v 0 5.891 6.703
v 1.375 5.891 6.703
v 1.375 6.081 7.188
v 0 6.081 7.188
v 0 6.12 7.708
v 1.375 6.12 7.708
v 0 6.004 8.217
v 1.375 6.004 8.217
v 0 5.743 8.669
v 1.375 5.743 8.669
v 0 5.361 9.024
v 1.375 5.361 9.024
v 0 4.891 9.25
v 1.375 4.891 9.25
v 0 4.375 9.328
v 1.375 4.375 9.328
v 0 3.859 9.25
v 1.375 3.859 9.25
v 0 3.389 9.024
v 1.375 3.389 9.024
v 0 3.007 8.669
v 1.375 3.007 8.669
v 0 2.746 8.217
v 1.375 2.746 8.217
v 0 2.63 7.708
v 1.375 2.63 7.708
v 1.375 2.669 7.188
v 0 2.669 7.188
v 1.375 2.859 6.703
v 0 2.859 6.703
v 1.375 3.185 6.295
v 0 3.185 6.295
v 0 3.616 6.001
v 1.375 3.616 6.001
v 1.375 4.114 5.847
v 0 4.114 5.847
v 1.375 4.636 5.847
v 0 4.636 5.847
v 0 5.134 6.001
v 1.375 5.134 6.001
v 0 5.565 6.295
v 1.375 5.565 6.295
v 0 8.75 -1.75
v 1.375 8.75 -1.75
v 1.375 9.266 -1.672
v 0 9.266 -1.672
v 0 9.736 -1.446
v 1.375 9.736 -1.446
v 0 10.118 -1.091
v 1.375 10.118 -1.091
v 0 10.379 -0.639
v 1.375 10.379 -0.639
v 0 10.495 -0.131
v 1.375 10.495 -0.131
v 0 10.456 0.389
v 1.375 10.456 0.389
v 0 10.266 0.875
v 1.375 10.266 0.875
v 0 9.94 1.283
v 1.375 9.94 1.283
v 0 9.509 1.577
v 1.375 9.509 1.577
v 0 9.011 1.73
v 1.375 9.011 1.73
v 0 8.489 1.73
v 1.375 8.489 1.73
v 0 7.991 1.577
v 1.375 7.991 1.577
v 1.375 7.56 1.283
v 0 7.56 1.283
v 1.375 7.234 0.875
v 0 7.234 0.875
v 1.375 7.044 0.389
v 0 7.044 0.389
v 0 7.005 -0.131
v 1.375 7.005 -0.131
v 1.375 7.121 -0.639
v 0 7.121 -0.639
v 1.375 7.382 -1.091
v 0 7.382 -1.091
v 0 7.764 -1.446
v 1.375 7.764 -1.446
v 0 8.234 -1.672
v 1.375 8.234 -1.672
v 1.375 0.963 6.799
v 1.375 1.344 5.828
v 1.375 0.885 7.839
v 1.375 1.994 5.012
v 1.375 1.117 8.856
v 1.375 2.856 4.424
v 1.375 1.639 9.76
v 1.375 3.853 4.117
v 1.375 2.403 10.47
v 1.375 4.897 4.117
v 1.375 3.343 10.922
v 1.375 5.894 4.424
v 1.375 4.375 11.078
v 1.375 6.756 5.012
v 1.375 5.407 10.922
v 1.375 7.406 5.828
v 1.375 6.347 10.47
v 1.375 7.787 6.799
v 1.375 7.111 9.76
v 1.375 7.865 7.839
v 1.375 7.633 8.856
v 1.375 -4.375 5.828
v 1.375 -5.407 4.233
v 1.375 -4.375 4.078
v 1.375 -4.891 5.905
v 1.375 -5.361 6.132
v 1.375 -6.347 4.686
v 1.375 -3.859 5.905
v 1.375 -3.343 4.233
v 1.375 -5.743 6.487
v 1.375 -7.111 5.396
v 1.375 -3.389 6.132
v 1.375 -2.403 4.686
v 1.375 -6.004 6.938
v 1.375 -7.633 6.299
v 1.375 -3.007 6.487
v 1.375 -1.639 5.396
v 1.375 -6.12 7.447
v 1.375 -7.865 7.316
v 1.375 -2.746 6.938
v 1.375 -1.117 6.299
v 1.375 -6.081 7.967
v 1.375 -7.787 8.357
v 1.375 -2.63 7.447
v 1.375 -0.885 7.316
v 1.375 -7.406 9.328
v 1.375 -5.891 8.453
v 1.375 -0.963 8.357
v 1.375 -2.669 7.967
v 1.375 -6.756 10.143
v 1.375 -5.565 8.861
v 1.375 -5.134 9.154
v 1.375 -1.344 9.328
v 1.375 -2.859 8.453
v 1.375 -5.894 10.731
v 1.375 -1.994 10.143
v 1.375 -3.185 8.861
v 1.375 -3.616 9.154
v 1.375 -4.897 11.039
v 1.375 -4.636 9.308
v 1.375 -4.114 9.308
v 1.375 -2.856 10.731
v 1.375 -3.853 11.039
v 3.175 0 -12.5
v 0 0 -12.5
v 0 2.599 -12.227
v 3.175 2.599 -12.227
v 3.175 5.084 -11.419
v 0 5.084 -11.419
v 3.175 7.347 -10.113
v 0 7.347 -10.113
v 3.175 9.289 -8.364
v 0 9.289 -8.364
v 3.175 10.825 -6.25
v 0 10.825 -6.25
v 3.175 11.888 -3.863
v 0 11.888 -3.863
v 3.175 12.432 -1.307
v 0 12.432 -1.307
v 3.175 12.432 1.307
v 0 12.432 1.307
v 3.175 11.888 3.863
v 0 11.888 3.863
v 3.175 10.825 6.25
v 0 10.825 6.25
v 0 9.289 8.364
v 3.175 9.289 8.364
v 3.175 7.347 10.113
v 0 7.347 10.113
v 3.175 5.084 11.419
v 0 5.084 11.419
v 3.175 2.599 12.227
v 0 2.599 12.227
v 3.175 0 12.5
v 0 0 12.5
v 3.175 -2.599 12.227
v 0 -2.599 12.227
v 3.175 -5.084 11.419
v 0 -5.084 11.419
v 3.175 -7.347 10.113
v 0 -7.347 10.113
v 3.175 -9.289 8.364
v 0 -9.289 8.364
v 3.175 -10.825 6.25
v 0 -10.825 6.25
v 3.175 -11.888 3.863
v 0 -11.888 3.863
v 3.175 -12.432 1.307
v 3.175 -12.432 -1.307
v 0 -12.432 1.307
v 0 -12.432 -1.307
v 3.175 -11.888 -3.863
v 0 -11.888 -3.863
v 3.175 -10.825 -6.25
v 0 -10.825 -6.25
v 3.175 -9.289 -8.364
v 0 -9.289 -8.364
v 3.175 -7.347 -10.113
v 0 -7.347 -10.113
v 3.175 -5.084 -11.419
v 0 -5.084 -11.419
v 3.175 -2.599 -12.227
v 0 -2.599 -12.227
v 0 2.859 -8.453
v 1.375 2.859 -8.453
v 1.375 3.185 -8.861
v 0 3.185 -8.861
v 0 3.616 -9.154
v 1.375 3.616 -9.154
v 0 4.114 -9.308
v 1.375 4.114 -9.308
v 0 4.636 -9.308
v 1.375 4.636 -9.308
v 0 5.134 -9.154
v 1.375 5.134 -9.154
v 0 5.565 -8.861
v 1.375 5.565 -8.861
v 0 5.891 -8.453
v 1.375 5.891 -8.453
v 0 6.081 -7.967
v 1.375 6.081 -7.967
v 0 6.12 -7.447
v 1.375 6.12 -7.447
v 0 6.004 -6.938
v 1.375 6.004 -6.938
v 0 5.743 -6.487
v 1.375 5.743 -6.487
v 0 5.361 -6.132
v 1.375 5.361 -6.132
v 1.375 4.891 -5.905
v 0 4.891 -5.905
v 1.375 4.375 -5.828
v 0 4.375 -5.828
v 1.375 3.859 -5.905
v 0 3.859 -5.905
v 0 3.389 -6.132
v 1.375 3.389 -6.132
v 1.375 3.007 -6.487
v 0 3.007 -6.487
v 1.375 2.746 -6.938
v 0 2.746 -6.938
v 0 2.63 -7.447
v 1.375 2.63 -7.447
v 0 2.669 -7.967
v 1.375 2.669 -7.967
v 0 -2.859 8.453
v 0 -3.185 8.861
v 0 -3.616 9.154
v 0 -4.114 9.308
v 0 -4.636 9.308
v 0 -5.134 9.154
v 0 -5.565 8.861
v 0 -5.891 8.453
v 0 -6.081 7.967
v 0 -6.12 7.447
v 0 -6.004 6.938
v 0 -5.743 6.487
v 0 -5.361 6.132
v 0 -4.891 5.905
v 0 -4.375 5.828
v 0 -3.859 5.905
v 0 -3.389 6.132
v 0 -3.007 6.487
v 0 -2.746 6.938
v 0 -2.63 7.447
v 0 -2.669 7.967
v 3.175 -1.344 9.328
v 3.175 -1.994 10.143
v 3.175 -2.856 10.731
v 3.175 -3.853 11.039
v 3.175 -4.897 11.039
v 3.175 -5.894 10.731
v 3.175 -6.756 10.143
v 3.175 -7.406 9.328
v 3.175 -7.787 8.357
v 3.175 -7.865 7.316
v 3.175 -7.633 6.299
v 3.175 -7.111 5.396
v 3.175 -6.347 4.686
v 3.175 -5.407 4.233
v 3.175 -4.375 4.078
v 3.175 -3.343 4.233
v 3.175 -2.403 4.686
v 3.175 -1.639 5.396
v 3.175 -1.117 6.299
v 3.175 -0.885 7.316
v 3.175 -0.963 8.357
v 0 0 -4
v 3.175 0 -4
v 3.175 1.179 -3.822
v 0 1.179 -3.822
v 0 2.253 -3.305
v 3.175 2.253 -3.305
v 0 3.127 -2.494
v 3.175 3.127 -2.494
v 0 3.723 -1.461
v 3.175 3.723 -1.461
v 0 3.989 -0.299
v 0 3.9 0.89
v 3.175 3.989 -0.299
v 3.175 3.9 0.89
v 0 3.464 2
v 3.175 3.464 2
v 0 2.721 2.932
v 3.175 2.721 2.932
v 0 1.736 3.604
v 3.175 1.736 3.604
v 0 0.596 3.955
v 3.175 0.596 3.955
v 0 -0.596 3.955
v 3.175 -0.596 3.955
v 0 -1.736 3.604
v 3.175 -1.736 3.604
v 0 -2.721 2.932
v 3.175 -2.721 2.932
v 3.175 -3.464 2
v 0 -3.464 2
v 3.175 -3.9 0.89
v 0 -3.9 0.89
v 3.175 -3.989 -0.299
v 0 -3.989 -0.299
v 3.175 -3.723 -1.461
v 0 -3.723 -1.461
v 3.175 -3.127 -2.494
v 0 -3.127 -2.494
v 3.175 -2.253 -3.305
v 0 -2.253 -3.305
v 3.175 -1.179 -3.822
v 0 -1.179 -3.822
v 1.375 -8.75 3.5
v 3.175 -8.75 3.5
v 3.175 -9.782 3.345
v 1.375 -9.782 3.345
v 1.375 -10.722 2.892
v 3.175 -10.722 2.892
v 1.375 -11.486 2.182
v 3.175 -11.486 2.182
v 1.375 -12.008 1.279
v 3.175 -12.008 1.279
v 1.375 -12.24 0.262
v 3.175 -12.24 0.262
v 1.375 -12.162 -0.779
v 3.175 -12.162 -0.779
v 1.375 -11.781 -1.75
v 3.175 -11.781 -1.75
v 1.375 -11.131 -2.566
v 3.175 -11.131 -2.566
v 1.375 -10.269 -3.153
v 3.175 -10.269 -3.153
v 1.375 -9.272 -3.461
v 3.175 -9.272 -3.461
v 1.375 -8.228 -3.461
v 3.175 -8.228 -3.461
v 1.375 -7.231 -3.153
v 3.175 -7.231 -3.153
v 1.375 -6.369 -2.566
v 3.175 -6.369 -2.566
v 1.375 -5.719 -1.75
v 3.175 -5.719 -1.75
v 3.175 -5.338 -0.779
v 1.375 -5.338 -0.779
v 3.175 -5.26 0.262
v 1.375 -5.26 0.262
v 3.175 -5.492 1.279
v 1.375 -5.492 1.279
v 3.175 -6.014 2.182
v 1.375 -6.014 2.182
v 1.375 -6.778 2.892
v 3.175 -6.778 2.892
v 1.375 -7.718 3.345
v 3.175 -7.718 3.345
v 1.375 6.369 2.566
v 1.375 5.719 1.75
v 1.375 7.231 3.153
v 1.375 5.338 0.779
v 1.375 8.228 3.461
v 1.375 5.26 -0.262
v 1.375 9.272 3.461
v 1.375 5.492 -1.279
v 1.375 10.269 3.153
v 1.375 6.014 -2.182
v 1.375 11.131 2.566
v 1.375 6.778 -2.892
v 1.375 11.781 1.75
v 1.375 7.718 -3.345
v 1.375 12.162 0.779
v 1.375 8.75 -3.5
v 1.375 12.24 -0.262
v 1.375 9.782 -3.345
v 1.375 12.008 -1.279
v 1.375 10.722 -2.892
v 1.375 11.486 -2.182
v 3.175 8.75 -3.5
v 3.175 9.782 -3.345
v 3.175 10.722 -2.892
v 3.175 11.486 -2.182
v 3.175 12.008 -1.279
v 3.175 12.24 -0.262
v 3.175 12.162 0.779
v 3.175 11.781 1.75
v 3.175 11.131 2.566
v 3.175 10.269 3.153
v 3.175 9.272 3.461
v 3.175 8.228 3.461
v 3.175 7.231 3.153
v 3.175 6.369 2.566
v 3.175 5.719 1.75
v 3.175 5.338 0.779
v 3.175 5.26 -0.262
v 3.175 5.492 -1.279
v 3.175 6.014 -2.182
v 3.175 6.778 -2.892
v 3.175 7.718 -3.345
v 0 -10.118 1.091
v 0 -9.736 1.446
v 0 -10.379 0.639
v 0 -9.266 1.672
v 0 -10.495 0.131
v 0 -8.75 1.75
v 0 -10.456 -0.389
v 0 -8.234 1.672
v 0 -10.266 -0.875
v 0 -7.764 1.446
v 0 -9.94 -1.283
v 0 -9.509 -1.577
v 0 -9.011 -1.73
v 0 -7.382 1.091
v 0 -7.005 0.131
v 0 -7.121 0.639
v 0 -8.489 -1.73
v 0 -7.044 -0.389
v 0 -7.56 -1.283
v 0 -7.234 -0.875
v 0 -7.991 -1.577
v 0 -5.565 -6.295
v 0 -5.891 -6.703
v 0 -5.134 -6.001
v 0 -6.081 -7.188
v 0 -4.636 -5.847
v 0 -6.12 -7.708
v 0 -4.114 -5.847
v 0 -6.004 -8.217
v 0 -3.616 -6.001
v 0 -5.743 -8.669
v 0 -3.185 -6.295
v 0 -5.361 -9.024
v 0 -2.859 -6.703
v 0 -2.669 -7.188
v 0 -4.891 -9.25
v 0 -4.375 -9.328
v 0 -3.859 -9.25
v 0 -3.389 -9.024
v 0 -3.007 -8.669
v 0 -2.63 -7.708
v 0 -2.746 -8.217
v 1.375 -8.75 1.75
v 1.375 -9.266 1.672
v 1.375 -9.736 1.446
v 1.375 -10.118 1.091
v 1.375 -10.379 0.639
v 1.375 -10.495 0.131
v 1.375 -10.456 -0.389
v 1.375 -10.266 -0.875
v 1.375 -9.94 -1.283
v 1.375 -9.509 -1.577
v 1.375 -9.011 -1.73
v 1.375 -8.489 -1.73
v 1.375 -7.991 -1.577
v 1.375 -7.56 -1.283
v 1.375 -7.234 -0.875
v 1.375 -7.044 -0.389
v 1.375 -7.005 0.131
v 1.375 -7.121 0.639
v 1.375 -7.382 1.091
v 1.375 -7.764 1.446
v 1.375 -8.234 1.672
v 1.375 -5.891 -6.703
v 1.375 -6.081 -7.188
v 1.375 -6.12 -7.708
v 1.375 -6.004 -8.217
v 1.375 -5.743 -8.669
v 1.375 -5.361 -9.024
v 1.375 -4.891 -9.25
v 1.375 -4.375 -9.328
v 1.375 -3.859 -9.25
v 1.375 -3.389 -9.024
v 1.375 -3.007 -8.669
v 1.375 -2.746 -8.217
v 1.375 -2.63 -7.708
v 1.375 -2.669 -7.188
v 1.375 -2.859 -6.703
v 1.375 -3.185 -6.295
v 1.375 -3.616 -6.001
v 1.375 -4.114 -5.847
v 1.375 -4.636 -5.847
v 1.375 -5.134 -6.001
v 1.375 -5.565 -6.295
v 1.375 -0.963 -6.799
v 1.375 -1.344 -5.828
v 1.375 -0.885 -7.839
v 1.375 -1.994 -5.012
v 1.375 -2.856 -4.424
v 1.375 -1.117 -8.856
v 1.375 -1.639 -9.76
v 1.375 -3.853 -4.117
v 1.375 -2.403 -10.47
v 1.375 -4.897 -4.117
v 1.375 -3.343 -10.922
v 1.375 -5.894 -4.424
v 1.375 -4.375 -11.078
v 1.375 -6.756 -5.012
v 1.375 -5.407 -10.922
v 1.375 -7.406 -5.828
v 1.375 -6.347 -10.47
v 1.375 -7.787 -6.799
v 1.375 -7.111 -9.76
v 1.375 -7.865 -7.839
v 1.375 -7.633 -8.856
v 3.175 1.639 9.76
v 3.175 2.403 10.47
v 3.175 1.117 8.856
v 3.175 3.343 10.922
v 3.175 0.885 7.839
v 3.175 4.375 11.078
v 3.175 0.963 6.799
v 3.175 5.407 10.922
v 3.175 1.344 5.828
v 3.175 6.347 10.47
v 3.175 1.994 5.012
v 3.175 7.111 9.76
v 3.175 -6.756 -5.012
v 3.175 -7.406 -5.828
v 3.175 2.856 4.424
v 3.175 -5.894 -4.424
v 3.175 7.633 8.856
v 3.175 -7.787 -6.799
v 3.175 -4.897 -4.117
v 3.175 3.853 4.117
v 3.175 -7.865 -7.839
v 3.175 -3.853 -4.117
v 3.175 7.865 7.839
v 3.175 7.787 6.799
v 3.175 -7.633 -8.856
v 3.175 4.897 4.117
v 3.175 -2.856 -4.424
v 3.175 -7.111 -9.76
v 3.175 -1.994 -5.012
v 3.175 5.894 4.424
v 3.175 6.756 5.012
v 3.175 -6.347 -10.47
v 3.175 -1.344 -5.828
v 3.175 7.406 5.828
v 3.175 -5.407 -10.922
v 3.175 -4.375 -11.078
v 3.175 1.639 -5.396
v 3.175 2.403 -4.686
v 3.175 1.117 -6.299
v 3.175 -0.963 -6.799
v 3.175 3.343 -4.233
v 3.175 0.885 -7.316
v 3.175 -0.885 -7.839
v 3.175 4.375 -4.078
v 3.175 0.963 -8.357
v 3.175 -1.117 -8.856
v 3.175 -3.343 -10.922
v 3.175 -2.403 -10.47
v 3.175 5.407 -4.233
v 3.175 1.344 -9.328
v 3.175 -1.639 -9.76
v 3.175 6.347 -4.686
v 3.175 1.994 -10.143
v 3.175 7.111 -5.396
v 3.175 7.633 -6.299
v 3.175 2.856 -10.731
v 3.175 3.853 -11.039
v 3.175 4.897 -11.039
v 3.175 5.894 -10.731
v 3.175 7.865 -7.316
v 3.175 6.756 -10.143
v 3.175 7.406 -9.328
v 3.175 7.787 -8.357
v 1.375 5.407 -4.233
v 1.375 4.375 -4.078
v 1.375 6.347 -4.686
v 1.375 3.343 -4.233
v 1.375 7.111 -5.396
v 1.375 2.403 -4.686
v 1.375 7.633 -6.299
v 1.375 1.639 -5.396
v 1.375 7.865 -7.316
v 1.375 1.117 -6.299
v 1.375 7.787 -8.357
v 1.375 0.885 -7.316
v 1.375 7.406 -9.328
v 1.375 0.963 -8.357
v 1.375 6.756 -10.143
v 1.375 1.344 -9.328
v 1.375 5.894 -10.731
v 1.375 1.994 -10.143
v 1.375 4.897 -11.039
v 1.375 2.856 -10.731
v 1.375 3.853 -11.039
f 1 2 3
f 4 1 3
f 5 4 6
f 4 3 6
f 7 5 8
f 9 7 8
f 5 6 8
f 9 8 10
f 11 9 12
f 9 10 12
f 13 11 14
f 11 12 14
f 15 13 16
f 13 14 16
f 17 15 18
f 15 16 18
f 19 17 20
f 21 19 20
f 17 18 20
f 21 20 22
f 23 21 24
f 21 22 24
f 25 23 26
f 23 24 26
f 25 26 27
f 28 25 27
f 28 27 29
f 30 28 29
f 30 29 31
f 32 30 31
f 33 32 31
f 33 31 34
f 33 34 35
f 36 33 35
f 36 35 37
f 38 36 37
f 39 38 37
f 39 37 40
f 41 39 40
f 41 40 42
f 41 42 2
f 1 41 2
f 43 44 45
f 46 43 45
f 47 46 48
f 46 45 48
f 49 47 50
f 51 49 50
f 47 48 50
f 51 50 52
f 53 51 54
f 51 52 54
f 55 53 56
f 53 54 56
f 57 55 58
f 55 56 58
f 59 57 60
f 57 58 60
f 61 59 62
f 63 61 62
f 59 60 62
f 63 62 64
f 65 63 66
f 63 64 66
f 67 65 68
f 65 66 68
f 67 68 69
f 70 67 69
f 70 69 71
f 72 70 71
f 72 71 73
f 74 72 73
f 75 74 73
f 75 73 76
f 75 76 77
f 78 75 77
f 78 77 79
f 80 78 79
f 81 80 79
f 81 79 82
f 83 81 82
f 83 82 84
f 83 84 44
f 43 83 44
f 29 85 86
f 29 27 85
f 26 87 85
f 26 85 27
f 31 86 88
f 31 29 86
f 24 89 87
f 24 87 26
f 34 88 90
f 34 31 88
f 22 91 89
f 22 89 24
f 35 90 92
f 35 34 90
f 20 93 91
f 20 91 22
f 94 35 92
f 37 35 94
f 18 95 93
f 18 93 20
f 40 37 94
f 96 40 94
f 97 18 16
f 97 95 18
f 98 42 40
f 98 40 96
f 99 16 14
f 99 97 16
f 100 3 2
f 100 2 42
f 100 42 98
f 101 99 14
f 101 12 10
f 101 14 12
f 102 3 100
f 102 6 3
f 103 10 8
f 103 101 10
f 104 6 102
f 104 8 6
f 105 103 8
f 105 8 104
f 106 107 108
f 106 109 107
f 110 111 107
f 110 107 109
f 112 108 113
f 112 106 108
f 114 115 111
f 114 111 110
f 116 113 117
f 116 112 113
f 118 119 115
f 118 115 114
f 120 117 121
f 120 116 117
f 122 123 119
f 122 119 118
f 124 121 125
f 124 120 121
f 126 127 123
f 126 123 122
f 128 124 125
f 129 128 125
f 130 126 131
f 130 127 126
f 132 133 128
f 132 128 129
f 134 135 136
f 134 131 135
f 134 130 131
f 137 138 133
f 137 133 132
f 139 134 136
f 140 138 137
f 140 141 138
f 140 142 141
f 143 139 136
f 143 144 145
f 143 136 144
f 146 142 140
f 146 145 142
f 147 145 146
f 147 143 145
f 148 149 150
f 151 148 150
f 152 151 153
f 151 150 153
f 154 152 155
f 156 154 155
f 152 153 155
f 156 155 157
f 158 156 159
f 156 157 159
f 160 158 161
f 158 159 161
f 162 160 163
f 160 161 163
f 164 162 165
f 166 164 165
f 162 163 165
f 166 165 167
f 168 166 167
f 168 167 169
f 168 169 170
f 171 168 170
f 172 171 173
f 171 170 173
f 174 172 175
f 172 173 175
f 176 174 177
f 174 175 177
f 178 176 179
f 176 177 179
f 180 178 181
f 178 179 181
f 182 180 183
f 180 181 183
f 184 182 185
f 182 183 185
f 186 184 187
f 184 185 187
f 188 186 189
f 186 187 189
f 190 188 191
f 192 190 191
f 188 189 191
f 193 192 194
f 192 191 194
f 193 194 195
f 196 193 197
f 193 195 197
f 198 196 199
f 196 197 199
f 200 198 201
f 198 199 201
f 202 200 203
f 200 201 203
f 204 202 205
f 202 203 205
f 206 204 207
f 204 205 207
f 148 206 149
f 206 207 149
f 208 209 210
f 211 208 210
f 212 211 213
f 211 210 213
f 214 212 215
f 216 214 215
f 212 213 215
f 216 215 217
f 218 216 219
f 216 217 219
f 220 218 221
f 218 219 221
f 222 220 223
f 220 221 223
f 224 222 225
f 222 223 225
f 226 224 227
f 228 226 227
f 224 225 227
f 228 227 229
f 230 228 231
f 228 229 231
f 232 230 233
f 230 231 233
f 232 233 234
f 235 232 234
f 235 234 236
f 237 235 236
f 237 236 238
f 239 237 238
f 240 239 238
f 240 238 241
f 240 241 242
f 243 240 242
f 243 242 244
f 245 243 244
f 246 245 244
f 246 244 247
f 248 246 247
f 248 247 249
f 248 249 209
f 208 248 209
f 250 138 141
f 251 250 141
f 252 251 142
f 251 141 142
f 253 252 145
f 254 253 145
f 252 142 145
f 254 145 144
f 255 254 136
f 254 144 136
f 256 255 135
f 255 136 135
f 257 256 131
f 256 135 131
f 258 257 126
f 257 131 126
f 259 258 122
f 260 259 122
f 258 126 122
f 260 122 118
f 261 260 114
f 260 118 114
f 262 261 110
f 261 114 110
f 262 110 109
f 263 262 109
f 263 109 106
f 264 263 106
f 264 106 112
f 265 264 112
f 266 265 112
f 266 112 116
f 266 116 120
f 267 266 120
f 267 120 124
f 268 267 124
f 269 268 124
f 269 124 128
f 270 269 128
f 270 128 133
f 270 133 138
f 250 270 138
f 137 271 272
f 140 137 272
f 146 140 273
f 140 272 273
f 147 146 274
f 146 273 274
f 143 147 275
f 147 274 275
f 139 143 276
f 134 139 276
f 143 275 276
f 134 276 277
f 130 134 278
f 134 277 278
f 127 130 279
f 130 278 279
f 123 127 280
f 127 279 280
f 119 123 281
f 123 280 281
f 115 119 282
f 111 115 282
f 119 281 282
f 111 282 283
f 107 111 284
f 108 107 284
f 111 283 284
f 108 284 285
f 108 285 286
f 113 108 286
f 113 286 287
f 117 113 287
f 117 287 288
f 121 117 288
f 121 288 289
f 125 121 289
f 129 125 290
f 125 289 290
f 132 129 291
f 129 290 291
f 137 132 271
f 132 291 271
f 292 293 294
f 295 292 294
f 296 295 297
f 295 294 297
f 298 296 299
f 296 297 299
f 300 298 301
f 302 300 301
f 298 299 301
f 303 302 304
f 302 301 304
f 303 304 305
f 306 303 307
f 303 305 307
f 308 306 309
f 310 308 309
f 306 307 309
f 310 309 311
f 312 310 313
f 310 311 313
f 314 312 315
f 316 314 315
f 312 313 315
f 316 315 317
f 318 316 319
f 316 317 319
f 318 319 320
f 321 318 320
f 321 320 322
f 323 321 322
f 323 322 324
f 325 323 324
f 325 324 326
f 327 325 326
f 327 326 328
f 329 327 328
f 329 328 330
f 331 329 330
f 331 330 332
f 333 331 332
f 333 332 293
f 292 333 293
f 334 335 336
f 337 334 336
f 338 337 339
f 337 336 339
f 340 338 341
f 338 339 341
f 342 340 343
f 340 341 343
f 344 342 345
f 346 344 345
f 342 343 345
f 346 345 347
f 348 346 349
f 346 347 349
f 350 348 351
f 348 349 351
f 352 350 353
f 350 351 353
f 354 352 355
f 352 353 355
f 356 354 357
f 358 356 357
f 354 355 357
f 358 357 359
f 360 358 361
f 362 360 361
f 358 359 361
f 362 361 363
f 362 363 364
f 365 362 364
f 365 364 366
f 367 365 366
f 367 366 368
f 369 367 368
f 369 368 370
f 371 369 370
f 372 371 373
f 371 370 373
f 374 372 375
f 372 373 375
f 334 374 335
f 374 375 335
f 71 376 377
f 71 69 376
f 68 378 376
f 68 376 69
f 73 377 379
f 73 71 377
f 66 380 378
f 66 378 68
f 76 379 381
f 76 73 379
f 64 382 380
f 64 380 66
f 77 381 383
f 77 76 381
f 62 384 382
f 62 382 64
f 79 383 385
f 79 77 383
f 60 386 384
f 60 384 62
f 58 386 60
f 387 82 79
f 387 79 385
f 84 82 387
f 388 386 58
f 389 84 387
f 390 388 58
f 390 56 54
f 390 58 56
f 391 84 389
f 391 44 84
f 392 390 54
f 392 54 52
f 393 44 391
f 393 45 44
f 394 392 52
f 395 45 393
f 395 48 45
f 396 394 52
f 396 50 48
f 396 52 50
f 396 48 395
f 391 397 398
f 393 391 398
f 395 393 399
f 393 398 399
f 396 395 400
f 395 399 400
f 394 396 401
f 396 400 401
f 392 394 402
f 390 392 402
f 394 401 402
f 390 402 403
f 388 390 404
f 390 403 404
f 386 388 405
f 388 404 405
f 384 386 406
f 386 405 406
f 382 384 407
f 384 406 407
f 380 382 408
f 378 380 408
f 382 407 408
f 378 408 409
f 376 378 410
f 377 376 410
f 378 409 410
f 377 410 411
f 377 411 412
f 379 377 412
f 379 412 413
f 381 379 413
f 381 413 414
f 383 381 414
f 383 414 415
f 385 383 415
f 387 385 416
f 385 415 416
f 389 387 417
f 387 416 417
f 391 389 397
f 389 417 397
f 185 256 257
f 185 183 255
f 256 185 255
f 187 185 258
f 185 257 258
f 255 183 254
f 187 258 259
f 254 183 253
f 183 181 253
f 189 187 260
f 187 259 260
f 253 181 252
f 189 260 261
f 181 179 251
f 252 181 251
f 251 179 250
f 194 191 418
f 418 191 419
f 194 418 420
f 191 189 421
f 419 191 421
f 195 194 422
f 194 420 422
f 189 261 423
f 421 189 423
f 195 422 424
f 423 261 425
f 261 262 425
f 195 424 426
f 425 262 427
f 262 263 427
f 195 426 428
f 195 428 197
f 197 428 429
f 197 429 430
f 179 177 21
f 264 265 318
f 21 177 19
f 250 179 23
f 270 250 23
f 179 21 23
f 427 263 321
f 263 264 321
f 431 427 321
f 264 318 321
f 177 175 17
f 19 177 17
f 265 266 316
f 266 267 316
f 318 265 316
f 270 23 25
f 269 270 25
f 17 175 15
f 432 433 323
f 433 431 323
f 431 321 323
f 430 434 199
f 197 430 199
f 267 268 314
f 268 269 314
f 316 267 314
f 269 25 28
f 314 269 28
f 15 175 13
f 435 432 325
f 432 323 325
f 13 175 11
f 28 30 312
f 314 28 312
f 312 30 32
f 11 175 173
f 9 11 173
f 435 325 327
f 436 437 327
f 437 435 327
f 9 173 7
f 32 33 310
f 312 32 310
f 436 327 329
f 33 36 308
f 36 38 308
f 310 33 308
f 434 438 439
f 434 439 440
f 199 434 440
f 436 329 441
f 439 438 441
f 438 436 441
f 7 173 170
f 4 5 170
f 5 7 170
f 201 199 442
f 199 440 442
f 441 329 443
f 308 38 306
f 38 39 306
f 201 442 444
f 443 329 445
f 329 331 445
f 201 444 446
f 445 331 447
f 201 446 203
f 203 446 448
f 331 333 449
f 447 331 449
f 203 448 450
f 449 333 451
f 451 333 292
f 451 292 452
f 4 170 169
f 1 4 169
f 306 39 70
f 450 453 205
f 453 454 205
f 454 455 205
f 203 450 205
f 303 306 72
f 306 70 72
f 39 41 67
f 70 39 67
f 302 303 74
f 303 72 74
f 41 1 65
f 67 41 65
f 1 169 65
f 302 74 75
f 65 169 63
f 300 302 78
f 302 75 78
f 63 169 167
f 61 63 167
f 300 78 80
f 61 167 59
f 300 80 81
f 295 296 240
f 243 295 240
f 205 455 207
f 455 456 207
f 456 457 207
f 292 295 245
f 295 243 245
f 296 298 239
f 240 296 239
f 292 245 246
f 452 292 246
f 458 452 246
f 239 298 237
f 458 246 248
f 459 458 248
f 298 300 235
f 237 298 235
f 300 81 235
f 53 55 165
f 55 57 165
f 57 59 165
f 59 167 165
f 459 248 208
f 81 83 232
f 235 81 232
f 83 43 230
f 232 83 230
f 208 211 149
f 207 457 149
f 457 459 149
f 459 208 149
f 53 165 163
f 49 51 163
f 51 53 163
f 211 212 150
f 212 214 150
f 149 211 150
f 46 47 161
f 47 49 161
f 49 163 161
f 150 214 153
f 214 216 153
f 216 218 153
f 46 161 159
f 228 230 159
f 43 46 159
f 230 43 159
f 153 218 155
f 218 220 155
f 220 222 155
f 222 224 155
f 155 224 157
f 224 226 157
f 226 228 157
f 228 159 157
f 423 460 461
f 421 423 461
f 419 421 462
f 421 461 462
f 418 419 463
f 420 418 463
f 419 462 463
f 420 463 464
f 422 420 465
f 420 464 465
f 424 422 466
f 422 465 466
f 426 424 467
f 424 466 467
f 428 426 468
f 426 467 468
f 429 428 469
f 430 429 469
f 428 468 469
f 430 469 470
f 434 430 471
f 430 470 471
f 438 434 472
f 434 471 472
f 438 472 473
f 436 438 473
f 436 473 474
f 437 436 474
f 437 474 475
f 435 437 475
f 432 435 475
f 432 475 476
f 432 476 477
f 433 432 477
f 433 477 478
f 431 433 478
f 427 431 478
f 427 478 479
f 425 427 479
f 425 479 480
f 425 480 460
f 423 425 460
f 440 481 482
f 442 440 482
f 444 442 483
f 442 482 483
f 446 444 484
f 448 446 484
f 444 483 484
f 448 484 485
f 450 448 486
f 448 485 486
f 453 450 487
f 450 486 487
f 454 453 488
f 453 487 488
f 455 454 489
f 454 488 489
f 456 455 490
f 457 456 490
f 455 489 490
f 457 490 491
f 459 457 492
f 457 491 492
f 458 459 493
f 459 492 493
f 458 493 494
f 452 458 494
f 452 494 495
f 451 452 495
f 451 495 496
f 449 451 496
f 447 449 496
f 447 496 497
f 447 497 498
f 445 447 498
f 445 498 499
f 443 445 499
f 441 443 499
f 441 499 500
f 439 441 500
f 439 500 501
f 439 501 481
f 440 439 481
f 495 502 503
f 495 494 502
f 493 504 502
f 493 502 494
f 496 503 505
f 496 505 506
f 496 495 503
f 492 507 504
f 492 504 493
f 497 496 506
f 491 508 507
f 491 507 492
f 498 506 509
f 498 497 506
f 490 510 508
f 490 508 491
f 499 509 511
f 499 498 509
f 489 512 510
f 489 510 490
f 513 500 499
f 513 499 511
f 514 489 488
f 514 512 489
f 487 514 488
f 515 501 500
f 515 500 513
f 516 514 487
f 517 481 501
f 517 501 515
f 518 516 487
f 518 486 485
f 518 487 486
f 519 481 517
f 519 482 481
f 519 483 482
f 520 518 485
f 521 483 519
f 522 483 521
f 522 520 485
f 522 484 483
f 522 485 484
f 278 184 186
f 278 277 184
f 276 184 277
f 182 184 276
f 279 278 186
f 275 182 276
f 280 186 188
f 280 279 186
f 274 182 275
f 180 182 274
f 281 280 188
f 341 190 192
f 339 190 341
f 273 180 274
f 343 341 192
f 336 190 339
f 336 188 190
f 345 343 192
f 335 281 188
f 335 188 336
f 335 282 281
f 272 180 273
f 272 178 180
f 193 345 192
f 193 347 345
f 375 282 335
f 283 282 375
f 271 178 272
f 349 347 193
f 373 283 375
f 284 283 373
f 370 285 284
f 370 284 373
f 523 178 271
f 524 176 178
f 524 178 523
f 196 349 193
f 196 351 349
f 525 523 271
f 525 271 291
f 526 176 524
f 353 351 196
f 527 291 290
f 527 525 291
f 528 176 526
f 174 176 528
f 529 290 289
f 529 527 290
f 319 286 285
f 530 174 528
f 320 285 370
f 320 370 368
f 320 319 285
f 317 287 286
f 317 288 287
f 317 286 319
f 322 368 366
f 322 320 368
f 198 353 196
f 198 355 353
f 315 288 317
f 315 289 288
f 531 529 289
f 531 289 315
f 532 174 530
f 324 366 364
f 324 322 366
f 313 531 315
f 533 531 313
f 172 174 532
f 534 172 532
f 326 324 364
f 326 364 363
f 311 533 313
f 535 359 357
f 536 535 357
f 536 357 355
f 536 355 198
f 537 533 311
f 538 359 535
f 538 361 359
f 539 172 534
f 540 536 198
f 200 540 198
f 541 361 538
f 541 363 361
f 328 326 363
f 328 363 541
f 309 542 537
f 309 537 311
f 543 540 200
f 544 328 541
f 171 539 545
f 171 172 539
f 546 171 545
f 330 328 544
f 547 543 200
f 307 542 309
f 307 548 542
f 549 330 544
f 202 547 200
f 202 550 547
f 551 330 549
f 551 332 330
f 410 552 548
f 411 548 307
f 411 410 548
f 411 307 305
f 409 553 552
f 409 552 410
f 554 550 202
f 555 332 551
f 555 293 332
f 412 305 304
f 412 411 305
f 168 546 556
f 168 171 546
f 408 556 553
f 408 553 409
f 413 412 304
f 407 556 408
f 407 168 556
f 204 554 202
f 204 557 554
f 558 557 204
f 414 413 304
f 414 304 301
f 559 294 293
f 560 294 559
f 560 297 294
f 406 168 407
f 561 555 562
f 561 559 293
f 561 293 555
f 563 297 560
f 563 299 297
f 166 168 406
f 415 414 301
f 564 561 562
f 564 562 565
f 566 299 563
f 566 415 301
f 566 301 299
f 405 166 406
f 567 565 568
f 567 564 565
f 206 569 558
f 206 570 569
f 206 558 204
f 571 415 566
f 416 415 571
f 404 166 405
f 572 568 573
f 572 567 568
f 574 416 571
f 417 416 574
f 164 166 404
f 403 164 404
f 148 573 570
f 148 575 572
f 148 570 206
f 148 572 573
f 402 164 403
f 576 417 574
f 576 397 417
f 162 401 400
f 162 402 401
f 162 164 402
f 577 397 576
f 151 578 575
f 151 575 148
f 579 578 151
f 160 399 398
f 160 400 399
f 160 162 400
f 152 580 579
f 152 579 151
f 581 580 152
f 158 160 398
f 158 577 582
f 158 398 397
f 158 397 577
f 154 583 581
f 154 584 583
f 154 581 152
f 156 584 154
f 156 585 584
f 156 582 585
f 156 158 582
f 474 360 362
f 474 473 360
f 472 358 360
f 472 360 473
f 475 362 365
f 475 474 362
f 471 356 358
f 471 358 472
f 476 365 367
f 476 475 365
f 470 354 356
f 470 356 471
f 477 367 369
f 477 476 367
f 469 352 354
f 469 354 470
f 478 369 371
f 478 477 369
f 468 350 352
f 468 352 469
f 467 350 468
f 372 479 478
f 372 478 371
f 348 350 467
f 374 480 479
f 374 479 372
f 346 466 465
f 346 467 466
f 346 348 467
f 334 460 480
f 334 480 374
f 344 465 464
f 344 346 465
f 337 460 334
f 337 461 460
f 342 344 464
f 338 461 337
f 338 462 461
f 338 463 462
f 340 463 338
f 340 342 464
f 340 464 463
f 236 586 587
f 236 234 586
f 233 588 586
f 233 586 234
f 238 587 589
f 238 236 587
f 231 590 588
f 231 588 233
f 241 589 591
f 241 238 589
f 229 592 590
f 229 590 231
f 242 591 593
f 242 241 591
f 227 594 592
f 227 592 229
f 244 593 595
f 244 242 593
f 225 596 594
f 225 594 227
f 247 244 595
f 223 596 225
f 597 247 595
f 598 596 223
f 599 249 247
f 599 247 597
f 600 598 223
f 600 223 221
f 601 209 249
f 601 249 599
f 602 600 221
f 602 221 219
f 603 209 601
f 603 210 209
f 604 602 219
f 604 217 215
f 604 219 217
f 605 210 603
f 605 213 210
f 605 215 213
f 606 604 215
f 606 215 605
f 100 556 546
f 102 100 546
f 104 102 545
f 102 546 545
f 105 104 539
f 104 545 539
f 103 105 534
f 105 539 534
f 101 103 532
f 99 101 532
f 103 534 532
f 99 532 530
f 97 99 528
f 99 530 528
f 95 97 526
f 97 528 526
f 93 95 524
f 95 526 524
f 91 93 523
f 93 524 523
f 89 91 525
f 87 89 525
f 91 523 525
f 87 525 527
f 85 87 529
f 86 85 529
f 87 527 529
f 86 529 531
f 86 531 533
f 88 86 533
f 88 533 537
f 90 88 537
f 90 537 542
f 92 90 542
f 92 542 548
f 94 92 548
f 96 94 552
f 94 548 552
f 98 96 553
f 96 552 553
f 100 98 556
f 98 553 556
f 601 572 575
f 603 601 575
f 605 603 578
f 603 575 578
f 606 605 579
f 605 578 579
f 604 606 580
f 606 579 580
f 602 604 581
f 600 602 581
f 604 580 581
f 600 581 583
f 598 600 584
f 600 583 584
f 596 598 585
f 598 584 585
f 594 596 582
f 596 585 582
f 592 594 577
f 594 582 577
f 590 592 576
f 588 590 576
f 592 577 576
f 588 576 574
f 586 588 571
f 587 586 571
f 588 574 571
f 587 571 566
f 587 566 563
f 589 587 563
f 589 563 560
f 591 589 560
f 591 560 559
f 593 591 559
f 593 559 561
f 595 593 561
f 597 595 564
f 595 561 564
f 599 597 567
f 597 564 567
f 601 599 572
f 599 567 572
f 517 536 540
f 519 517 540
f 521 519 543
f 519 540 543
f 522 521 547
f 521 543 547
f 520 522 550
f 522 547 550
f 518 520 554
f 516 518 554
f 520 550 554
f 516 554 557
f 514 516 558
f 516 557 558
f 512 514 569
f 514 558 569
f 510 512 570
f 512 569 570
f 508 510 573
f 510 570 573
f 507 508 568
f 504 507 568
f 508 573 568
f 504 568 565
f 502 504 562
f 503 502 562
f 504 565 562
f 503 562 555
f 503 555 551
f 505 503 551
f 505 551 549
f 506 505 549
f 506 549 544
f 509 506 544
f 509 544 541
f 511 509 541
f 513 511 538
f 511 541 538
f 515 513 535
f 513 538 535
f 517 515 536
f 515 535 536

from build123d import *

# Parameters (mm, degrees)
SKETCH1_R           = 12.5
BOSS_EXTRUDE1_DEPTH = 3.175
SKETCH3_R           = 4
CUT_EXTRUDE1_DEPTH  = 18.960529641
SKETCH2_R           = 1.75
CUT_EXTRUDE2_DEPTH  = 18.960529641
SKETCH4_R           = 3.5
SKETCH4_R_2         = 1.75
CUT_EXTRUDE3_DEPTH  = 1.8
CIRPATTERN1_COUNT   = 6


with BuildPart() as part:
    # Sketch1 → Boss-Extrude1 (new body)
    with BuildSketch(Plane(origin=(0, 0, 0), x_dir=(0, 0, -1), z_dir=(1, 0, 0))):
        Circle(SKETCH1_R)
    extrude(amount=BOSS_EXTRUDE1_DEPTH)

    # Sketch3 → Cut-Extrude1 (cut, through all)
    with BuildSketch(Plane(origin=(3.175, 0, 0), x_dir=(0, 0, -1), z_dir=(1, 0, 0))):
        Circle(SKETCH3_R)
    extrude(amount=-CUT_EXTRUDE1_DEPTH, mode=Mode.SUBTRACT)

    # Sketch2 → Cut-Extrude2 (cut, through all)
    with BuildSketch(Plane(origin=(3.175, 0, 0), x_dir=(0, 0, -1), z_dir=(1, 0, 0))):
        with Locations((0, 8.75)):
            Circle(SKETCH2_R)
    cut_extrude2 = extrude(amount=-CUT_EXTRUDE2_DEPTH, mode=Mode.SUBTRACT)

    # Sketch4 → Cut-Extrude3 (cut)
    # profile 1 of 3: a face of its own
    with BuildSketch(Plane(origin=(3.175, 0, 0), x_dir=(0, 0, -1), z_dir=(1, 0, 0))):
        with Locations((0, 8.75)):
            Circle(SKETCH4_R)
        Polygon((3.175426481, 8.75), (1.58771324, 11.5), (-1.58771324, 11.5), (-3.175426481, 8.75), (-1.58771324, 6), (1.58771324, 6), align=None, mode=Mode.SUBTRACT)
    # profile 2 of 3: a face of its own
    with BuildSketch(Plane(origin=(3.175, 0, 0), x_dir=(0, 0, -1), z_dir=(1, 0, 0))):
        Polygon((1.58771324, 6), (3.175426481, 8.75), (1.58771324, 11.5), (-1.58771324, 11.5), (-3.175426481, 8.75), (-1.58771324, 6), align=None)
        with Locations((0, 8.75)):
            Circle(SKETCH4_R_2, mode=Mode.SUBTRACT)
    # profile 3 of 3: a face of its own
    with BuildSketch(Plane(origin=(3.175, 0, 0), x_dir=(0, 0, -1), z_dir=(1, 0, 0))):
        with Locations((0, 8.75)):
            Circle(SKETCH4_R_2)
    cut_extrude3 = extrude(amount=-CUT_EXTRUDE3_DEPTH, mode=Mode.SUBTRACT)

    # CirPattern1: Cut-Extrude2, Cut-Extrude3 ×6 about axis
    cirpattern1_axis = Axis((0, 0, 0), (1, 0, 0))
    add([cut_extrude2.rotate(cirpattern1_axis, i * 360 / CIRPATTERN1_COUNT) for i in range(1, CIRPATTERN1_COUNT)], mode=Mode.SUBTRACT)
    add([cut_extrude3.rotate(cirpattern1_axis, i * 360 / CIRPATTERN1_COUNT) for i in range(1, CIRPATTERN1_COUNT)], mode=Mode.SUBTRACT)


solid = part.part
